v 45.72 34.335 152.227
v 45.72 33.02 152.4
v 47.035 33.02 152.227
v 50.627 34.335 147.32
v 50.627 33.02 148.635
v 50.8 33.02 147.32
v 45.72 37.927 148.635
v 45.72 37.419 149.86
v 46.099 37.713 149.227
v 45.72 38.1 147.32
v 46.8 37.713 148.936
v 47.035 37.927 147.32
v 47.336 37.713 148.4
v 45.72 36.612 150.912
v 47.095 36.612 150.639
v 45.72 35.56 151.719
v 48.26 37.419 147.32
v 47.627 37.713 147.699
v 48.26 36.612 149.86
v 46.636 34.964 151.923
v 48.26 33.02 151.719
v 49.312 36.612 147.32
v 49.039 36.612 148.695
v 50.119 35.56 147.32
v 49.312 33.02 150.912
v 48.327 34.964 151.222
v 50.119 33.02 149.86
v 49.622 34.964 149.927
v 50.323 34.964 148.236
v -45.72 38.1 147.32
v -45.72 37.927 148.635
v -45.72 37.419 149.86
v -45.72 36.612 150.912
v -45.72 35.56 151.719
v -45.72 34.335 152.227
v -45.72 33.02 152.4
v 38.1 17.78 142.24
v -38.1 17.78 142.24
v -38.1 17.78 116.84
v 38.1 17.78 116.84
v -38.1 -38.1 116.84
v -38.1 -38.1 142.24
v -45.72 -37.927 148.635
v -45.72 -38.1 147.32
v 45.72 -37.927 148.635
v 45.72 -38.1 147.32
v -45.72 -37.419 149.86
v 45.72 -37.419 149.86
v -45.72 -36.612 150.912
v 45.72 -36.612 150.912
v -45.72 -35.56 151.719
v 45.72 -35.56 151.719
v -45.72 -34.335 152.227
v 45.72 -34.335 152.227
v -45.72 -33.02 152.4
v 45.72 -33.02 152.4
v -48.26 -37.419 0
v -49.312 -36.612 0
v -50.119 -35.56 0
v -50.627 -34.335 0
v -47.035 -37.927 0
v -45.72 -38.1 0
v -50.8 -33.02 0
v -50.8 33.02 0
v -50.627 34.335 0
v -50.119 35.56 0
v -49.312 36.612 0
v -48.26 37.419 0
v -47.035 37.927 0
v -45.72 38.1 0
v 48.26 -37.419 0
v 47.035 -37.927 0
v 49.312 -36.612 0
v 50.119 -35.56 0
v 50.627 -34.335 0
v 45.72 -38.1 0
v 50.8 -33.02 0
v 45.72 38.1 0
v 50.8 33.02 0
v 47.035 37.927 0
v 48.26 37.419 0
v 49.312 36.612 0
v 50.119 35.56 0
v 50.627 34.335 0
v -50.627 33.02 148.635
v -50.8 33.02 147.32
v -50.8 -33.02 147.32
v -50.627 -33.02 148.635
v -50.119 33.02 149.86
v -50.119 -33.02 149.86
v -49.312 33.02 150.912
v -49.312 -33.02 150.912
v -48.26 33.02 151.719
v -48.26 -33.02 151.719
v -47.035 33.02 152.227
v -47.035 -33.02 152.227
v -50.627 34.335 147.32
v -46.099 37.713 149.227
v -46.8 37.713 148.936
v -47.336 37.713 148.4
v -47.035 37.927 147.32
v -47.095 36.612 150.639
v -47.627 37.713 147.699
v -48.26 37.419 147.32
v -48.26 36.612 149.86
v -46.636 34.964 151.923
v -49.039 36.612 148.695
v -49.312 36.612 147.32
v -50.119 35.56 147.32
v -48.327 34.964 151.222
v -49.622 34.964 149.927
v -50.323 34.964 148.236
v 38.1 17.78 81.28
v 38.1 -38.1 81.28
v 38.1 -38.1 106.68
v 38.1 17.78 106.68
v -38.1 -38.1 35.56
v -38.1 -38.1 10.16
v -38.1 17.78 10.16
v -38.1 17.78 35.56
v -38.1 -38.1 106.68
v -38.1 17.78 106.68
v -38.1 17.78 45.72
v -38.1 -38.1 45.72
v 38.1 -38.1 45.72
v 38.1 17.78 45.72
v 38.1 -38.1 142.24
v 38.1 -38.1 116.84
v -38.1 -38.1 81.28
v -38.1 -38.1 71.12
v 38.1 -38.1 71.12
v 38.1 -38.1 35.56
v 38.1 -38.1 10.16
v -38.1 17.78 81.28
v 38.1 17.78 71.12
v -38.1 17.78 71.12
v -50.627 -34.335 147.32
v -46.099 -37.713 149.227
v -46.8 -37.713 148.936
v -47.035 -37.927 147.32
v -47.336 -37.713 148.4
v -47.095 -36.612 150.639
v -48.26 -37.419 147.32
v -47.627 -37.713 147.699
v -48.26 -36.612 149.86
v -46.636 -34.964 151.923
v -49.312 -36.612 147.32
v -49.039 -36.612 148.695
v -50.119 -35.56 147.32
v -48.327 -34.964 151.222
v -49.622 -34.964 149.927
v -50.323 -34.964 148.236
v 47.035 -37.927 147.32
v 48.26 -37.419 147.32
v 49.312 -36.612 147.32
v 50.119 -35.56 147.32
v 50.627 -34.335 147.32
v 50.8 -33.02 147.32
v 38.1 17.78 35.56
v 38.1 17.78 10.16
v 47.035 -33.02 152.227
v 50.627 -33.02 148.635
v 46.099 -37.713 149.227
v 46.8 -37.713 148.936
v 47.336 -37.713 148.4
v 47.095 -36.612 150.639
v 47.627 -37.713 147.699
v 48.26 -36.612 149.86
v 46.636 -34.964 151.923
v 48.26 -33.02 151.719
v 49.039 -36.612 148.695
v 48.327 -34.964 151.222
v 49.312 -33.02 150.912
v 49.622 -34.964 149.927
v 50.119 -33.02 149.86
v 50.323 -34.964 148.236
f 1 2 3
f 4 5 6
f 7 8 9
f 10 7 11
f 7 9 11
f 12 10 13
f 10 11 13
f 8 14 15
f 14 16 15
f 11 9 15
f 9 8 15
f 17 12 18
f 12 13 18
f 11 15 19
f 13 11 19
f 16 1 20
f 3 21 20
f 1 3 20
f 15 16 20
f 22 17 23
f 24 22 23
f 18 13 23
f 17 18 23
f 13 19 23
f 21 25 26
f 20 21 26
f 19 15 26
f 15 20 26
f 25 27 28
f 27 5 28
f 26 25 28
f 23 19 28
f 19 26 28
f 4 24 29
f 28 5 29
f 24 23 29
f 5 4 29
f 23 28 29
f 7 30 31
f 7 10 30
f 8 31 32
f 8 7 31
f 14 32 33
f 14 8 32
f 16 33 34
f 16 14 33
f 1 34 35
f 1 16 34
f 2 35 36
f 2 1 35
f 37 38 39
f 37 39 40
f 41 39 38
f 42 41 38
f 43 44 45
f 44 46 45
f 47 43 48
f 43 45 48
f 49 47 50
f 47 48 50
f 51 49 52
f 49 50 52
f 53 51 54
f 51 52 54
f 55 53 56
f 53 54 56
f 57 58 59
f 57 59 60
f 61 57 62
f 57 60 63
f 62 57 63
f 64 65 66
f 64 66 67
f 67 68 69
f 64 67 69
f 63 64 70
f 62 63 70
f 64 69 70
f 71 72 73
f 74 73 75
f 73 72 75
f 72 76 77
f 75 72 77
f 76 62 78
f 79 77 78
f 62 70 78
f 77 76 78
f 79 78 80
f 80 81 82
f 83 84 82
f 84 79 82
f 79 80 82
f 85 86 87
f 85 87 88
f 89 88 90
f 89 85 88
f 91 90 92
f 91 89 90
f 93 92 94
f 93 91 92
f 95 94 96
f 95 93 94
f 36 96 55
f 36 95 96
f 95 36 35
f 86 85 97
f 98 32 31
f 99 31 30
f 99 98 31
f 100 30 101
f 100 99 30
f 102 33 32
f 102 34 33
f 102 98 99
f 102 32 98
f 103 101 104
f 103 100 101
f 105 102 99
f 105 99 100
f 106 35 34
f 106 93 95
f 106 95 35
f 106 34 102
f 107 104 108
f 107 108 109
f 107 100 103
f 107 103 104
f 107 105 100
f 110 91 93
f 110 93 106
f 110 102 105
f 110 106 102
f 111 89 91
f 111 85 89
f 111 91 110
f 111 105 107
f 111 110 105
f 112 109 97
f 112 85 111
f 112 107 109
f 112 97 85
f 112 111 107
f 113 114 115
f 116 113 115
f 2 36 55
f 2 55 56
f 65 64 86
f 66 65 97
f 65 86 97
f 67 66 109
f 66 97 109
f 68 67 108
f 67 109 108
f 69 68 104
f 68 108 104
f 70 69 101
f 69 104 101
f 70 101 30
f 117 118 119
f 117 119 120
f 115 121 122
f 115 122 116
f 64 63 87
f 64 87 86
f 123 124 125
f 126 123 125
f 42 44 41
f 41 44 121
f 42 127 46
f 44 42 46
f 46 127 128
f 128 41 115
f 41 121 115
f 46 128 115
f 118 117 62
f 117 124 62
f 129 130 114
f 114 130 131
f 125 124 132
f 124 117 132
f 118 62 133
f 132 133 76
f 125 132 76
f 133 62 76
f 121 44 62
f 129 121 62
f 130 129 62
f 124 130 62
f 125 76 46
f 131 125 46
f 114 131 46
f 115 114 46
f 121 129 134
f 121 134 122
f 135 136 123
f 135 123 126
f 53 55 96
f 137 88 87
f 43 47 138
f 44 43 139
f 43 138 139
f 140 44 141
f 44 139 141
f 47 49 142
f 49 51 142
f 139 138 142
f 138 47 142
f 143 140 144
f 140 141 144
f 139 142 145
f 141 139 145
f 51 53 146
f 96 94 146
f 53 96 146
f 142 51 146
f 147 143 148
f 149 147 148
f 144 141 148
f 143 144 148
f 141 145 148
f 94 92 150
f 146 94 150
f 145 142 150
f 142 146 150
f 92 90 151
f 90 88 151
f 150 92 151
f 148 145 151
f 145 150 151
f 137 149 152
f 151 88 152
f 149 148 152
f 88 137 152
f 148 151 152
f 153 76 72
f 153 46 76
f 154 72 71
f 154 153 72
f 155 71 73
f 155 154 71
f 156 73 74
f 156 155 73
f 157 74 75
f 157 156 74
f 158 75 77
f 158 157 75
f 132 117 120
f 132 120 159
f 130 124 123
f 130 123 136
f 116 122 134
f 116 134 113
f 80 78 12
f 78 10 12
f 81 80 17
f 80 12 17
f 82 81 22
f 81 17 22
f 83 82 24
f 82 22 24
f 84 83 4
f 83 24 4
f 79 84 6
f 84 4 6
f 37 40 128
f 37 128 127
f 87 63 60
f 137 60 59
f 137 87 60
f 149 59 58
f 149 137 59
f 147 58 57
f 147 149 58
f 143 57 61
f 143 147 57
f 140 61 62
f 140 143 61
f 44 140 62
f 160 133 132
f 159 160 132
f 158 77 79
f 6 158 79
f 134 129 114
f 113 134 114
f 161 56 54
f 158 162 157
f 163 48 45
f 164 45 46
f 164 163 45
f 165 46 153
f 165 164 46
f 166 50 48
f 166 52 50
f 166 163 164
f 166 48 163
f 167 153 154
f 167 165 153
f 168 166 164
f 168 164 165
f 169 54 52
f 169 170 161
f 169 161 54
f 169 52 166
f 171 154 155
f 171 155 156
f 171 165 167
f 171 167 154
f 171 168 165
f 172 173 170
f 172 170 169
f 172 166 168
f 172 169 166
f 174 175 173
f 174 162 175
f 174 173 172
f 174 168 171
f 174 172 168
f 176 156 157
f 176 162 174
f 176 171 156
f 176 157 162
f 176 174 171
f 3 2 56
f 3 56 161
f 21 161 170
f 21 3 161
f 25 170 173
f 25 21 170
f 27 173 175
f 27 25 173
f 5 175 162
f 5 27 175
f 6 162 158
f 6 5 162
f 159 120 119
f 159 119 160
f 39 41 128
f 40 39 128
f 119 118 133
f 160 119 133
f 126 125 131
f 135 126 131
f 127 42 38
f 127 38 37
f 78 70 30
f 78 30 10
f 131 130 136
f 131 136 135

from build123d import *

# Parameters (mm, degrees)
F0_W     = 101.6
F0_H     = 76.2
F1_DEPTH = 152.4
F2_W     = 76.2
F2_H     = 25.4
F3_DEPTH = 55.88
F4_R     = 5.08


with BuildPart() as f1:
    # F0 (on Top) → F1 (new body)
    with BuildSketch(Plane.XY):
        Rectangle(F0_W, F0_H)
    extrude(amount=F1_DEPTH)

    # F2 (on face) → F3 (cut)
    with BuildSketch(Plane.XZ.offset(38.1)):
        with Locations((0, 129.54)):
            Rectangle(F2_W, F2_H)
        with Locations((0, 93.98)):
            Rectangle(F2_W, F2_H)
        with Locations((0, 58.42)):
            Rectangle(F2_W, F2_H)
        with Locations((0, 22.86)):
            Rectangle(F2_W, F2_H)
    extrude(amount=-F3_DEPTH, mode=Mode.SUBTRACT)

    # F4
    f4_edges = [f1.edges().sort_by_distance(p)[0] for p in [
        (50.8, 0, 152.4),
        (-50.8, 0, 152.4),
        (0, -38.1, 152.4),
        (0, 38.1, 152.4),
        (50.8, -38.1, 76.2),
        (50.8, 38.1, 76.2),
        (-50.8, -38.1, 76.2),
        (-50.8, 38.1, 76.2),
    ]]
    fillet(f4_edges, radius=F4_R)


solid = f1.part
